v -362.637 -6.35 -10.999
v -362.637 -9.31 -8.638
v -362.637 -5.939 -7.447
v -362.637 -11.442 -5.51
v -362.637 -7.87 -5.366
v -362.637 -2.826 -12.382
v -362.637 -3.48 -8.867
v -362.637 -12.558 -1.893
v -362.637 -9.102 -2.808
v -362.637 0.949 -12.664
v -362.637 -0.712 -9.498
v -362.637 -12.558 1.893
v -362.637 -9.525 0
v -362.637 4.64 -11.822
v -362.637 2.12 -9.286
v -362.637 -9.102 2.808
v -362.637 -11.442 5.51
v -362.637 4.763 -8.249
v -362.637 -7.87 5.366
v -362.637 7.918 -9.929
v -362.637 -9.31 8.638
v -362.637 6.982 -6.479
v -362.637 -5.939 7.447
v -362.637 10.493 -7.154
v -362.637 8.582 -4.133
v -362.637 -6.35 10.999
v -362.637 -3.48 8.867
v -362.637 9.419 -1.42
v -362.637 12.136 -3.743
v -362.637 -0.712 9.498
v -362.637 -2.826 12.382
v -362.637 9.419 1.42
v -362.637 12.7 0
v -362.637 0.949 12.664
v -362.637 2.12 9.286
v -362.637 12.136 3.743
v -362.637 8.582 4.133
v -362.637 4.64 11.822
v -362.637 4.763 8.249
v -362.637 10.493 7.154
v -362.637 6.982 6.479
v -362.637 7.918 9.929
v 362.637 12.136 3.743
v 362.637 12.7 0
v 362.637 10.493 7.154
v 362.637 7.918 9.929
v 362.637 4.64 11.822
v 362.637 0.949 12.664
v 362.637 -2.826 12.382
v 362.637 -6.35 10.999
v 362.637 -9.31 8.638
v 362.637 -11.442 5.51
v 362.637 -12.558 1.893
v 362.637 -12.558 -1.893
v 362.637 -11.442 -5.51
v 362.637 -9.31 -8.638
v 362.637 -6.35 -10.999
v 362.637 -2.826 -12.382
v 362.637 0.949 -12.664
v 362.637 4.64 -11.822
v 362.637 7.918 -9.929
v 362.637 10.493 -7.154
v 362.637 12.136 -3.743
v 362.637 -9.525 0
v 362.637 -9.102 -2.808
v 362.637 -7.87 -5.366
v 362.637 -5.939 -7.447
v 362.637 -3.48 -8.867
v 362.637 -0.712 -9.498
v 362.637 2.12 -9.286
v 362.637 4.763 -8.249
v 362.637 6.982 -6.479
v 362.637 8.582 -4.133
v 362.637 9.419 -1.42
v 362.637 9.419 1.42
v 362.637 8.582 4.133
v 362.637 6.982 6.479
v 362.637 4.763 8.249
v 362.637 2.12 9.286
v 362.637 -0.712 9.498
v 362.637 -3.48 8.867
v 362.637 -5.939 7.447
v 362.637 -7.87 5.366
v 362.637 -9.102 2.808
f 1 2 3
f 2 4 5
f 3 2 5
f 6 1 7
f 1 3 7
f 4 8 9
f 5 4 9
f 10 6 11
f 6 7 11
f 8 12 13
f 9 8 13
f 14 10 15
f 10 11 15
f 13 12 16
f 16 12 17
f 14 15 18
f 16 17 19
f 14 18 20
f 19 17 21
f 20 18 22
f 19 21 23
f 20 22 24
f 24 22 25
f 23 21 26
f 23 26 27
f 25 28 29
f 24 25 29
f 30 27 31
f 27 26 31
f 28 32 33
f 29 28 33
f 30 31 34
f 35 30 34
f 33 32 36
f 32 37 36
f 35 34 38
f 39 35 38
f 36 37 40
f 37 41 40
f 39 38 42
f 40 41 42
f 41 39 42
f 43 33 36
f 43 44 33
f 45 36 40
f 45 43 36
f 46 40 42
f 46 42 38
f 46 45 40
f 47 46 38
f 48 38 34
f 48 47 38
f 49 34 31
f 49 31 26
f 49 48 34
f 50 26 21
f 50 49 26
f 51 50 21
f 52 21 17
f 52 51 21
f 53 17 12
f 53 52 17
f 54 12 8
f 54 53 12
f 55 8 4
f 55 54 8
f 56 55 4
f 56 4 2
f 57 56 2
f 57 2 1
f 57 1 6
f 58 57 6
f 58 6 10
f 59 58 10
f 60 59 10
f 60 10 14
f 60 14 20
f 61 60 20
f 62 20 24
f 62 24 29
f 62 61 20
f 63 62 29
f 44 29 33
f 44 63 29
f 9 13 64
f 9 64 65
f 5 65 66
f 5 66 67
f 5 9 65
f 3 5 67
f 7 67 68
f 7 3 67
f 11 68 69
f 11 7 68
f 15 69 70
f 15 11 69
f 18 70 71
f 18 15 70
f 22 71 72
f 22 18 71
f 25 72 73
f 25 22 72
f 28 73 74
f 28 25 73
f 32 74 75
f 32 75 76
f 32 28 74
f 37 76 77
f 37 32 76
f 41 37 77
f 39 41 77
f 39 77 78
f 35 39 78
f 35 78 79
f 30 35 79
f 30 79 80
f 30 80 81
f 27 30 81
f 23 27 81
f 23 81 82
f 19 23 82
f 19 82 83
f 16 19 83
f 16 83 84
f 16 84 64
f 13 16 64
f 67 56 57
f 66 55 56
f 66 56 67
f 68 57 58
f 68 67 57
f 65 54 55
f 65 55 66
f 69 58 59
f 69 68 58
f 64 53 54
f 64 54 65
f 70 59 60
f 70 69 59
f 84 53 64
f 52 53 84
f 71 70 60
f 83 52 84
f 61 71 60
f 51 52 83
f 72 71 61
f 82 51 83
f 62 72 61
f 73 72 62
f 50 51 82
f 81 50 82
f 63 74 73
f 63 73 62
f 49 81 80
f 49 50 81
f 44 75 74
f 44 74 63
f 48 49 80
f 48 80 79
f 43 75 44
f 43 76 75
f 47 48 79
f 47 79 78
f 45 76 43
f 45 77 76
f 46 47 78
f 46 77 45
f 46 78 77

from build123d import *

# Parameters (mm, degrees)
F0_R     = 12.7
F2_DEPTH = 362.63707
F3_D     = 19.05


with BuildPart() as f2:
    # F0 (on Right) → F2 (new body)
    with BuildSketch(Plane.YZ):
        Circle(F0_R)
    extrude(amount=F2_DEPTH)

    # F3 (through all)
    with Locations(Plane(origin=(0, 0, 0), x_dir=(0, 1, 0), z_dir=(-1, 0, 0))):
        with Locations((0, 0)):
            Hole(F3_D / 2)

    # F4: F2 across plane


with BuildPart() as f2_1:
    add(f2.part)
    add(f2.part.mirror(Plane.YZ))


solid = f2_1.part
